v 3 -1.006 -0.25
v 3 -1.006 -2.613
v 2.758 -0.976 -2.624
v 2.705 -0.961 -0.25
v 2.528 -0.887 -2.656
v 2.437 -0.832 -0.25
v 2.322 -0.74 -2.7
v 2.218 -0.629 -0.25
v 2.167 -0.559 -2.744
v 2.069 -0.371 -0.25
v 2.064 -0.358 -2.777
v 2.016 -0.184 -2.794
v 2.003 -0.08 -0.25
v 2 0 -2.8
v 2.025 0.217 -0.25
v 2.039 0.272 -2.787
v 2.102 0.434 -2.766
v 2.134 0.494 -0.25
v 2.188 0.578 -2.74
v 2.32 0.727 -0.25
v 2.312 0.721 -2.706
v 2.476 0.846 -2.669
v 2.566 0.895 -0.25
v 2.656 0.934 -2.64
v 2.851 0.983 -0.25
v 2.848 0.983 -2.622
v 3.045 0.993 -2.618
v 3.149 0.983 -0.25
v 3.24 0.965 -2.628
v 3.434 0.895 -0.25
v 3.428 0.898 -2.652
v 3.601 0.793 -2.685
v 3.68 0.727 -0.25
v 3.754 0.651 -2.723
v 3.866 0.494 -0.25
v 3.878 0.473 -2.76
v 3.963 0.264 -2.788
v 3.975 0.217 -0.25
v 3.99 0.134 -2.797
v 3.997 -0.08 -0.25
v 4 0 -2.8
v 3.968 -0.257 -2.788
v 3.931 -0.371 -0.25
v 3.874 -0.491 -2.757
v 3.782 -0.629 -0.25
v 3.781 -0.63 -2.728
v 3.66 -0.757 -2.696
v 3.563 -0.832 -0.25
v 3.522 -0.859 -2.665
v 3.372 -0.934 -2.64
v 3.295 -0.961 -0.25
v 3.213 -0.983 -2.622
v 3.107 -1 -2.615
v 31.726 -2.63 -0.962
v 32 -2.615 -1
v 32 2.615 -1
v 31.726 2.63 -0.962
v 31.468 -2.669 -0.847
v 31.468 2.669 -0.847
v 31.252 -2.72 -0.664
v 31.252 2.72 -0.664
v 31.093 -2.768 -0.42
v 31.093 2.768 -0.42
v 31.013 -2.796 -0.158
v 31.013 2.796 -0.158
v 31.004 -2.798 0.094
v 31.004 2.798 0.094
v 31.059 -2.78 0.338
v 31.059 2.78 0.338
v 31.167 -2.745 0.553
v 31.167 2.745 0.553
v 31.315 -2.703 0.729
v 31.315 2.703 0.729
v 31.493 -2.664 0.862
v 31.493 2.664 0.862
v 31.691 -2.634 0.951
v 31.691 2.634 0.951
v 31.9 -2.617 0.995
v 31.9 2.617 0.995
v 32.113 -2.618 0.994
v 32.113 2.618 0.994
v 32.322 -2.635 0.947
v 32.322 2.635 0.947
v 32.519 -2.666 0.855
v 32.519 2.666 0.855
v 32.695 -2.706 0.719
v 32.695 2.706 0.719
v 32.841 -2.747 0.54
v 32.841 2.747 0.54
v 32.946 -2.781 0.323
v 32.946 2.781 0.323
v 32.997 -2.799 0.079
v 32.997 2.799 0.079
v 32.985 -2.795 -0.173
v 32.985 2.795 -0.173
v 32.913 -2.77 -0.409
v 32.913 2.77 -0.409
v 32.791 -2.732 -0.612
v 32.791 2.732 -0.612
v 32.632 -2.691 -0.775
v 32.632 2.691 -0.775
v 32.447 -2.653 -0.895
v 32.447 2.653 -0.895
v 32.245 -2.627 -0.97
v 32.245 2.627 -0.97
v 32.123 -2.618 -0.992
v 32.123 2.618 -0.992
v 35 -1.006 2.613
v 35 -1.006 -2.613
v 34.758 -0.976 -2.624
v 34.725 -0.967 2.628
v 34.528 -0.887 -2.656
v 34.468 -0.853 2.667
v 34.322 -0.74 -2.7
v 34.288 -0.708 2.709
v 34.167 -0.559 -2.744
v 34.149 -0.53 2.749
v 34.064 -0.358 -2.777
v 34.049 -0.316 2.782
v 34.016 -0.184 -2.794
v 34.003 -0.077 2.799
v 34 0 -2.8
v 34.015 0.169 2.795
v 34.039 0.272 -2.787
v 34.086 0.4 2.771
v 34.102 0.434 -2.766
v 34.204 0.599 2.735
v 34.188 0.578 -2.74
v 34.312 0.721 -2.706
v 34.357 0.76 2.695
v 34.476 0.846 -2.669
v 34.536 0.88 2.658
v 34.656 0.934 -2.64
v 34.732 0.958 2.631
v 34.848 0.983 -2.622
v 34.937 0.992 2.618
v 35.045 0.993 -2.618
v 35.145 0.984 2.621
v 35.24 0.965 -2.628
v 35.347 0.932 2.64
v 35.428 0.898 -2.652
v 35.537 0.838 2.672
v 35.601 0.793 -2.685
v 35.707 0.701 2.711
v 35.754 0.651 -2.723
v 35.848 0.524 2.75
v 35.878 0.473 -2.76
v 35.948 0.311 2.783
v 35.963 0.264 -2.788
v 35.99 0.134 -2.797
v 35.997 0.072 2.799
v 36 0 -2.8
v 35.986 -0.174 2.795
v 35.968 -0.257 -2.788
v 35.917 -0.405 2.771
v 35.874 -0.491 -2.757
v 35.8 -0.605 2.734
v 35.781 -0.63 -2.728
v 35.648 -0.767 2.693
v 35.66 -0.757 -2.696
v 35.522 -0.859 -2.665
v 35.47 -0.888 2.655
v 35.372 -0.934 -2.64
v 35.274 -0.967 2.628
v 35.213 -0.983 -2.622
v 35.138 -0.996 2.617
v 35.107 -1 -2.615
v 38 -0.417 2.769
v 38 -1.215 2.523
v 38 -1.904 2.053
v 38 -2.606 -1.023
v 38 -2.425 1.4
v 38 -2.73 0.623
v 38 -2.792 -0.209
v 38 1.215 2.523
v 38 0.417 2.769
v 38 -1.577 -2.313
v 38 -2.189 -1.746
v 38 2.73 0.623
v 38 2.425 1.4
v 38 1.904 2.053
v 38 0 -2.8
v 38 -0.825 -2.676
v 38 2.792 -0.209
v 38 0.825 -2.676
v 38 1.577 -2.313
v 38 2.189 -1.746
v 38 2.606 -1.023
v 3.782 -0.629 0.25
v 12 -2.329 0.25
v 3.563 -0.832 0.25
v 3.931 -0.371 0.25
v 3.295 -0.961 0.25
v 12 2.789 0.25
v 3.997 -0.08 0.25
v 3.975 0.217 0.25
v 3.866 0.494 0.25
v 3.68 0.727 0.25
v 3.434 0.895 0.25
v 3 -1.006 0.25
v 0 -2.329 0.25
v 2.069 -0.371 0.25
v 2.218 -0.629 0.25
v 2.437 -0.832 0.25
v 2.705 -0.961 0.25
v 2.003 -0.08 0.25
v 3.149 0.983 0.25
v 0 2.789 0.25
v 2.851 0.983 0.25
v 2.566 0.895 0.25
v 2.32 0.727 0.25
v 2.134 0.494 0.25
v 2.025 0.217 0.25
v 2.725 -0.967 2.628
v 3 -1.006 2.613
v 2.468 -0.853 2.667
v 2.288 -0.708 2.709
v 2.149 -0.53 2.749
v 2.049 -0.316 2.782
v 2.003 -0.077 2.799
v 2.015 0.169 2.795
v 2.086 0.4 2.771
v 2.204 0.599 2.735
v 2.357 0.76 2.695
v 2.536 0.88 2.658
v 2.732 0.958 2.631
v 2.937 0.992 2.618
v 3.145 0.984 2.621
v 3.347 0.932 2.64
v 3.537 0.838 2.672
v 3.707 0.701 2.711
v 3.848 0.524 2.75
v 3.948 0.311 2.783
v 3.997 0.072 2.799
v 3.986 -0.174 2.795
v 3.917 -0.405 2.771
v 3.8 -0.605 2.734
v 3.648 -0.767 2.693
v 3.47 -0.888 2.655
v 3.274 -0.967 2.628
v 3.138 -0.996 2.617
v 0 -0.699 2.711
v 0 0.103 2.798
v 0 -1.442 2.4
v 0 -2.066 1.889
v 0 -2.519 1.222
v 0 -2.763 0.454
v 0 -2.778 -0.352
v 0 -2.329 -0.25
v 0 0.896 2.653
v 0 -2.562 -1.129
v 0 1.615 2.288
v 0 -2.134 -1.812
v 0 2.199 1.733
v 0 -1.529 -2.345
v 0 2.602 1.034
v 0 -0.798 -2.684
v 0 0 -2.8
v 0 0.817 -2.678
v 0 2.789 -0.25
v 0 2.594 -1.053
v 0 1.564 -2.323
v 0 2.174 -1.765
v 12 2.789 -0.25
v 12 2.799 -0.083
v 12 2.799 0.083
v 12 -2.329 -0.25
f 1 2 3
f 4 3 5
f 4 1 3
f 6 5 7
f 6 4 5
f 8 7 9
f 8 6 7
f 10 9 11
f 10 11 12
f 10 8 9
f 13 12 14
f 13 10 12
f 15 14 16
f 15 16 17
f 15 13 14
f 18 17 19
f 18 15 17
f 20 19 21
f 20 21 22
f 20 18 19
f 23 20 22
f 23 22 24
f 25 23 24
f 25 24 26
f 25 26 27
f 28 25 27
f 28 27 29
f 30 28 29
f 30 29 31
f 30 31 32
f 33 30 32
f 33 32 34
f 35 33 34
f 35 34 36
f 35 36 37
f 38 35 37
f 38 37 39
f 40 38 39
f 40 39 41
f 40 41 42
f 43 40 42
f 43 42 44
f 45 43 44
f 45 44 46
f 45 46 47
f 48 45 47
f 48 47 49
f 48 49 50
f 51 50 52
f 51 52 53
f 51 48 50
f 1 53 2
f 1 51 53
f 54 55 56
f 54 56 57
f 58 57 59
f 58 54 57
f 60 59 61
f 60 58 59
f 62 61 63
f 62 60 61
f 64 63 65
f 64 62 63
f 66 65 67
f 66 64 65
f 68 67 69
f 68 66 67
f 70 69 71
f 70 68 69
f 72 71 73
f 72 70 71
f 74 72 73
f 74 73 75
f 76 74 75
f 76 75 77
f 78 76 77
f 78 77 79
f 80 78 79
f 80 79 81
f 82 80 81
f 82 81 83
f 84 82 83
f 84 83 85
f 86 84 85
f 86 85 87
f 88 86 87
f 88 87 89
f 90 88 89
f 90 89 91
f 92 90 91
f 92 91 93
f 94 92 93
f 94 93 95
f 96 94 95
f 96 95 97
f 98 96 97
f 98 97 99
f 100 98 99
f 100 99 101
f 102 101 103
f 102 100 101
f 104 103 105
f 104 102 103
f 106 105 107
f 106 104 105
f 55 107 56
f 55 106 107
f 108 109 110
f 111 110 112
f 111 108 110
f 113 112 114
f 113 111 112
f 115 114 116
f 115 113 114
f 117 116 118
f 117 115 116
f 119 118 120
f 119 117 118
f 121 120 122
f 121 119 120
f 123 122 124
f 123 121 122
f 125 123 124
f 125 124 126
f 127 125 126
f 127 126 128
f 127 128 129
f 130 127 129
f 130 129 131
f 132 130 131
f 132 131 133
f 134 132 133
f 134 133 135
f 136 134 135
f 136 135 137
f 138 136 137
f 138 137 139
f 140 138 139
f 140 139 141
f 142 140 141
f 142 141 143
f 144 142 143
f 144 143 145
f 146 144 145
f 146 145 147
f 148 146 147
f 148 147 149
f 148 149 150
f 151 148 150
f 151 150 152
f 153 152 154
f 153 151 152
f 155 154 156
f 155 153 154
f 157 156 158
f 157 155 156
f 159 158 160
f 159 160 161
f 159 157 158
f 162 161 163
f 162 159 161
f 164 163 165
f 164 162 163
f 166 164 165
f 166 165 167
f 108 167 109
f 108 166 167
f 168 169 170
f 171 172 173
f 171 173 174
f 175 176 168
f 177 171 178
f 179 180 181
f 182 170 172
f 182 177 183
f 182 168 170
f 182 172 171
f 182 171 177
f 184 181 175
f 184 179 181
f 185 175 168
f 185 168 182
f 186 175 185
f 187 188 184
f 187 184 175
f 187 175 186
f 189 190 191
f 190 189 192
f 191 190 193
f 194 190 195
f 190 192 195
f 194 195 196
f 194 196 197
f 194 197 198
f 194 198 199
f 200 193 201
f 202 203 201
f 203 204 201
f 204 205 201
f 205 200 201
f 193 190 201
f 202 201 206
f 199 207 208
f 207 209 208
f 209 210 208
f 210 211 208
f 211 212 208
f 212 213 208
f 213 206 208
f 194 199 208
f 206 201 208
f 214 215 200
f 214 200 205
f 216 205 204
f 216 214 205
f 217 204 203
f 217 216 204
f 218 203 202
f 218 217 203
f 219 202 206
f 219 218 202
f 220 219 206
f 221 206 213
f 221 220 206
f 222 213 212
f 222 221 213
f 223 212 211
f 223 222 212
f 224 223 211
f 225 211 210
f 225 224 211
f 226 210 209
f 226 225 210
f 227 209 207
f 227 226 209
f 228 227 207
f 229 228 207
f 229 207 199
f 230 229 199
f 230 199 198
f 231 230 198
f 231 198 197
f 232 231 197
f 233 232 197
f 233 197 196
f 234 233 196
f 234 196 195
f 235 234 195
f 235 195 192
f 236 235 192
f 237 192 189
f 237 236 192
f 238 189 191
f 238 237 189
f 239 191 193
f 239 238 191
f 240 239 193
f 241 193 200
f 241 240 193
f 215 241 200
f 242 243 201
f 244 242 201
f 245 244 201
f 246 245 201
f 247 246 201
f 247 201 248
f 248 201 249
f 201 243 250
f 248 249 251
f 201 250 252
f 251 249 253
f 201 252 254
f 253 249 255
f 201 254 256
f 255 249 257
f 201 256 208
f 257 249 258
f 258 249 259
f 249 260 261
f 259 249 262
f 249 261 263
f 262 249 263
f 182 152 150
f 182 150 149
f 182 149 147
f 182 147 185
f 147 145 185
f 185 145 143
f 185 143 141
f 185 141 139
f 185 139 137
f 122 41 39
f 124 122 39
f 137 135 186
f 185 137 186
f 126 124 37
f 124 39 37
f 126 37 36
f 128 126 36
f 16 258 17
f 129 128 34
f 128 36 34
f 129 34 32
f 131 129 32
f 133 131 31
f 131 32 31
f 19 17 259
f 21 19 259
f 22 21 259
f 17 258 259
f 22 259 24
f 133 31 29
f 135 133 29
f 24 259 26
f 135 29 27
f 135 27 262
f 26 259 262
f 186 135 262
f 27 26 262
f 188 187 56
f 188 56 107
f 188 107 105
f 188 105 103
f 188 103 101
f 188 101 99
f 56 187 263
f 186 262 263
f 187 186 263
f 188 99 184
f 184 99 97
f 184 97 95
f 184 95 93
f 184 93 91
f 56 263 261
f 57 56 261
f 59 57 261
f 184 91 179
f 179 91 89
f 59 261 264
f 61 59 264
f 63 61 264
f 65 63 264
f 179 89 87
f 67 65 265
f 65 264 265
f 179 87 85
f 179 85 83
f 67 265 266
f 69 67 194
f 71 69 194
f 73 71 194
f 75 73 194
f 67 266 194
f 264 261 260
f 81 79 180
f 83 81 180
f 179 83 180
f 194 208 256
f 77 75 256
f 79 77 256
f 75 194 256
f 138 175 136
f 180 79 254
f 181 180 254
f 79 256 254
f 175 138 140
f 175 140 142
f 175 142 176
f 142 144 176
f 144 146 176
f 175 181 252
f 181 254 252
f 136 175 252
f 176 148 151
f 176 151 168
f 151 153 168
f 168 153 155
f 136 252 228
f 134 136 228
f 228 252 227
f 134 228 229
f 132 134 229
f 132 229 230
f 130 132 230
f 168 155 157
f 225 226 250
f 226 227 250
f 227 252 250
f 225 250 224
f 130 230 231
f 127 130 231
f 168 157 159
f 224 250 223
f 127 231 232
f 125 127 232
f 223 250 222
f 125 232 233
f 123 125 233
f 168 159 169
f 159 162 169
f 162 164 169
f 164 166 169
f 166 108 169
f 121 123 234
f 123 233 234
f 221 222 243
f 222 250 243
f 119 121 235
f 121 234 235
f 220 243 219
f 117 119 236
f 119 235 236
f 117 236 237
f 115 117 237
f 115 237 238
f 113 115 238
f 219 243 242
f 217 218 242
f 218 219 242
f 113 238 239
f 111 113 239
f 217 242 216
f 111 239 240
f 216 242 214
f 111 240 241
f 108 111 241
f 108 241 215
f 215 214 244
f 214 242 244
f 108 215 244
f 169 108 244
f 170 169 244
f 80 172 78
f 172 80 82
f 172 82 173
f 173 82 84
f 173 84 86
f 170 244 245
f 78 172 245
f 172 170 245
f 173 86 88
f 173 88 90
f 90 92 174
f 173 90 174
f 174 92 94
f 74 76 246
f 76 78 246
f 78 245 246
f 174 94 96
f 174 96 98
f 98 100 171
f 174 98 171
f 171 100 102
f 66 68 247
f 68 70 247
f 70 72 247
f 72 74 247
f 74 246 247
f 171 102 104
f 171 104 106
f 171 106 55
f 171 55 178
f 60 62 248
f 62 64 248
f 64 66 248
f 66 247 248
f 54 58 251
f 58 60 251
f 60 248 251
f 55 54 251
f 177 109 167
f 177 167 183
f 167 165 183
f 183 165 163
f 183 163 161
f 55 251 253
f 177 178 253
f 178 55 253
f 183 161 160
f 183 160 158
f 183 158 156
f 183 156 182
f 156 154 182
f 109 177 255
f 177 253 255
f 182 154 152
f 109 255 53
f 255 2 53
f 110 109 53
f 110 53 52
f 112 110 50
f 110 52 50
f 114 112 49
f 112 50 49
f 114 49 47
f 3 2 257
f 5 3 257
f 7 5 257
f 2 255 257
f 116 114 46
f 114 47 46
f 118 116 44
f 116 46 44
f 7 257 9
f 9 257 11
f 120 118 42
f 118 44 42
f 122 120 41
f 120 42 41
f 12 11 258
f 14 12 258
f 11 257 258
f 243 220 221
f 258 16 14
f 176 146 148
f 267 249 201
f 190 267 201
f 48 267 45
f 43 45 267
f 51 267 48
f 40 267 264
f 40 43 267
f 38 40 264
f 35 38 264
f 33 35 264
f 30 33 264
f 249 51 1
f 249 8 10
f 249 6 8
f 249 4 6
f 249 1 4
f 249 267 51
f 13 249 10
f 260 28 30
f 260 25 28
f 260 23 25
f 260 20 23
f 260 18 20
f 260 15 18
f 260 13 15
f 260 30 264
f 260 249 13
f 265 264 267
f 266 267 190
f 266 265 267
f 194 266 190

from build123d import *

# Parameters (mm, degrees)
SKETCH_1_R               = 2.8
EXTRUDE_1_DEPTH          = 38
SKETCH_2_W               = 0.5
SKETCH_2_H               = 5.450532248
CUT_EXTRUDE_1_DEPTH      = 12
CUT_EXTRUDE_2_DEPTH      = 10
CUT_EXTRUDE_2_DEPTH_BACK = 10
SKETCH_3_R               = 1
CUT_EXTRUDE_3_DEPTH      = 10
CUT_EXTRUDE_3_DEPTH_BACK = 10
SKETCH_7_R               = 1


with BuildPart() as part:
    # 草图1 → 凸台-拉伸1 (new body)
    with BuildSketch(Plane(origin=(0, 0, 0), x_dir=(0, 0, -1), z_dir=(1, 0, 0))):
        Circle(SKETCH_1_R)
    extrude(amount=EXTRUDE_1_DEPTH)

    # 草图2 → 切除-拉伸1 (cut)
    with BuildSketch(Plane.ZY):
        with Locations((0, 0.396255312)):
            Rectangle(SKETCH_2_W, SKETCH_2_H)
    extrude(amount=-CUT_EXTRUDE_1_DEPTH, mode=Mode.SUBTRACT)

    # 草图3 → 切除-拉伸2 (cut, two sides: drawn at the far end of the back side and taken through both)
    with BuildSketch(Plane(origin=(0, 0, 0.25), x_dir=(-1, 0, 0), z_dir=(0, 0, -1)).offset(-CUT_EXTRUDE_2_DEPTH_BACK)):
        with Locations((-3, -0.005591523)):
            Circle(SKETCH_3_R)
        with Locations((-35, -0.005591523)):
            Circle(SKETCH_3_R)
    extrude(amount=CUT_EXTRUDE_2_DEPTH + CUT_EXTRUDE_2_DEPTH_BACK, mode=Mode.SUBTRACT)

    # 草图7 → 切除-拉伸3 (cut, two sides: drawn at the far end of the back side and taken through both)
    with BuildSketch(Plane(origin=(0, 0, 0), x_dir=(1, 0, 0), z_dir=(0, 1, 0)).offset(-CUT_EXTRUDE_3_DEPTH_BACK)):
        with Locations((32, 0)):
            Circle(SKETCH_7_R)
    extrude(amount=CUT_EXTRUDE_3_DEPTH + CUT_EXTRUDE_3_DEPTH_BACK, mode=Mode.SUBTRACT)


solid = part.part
